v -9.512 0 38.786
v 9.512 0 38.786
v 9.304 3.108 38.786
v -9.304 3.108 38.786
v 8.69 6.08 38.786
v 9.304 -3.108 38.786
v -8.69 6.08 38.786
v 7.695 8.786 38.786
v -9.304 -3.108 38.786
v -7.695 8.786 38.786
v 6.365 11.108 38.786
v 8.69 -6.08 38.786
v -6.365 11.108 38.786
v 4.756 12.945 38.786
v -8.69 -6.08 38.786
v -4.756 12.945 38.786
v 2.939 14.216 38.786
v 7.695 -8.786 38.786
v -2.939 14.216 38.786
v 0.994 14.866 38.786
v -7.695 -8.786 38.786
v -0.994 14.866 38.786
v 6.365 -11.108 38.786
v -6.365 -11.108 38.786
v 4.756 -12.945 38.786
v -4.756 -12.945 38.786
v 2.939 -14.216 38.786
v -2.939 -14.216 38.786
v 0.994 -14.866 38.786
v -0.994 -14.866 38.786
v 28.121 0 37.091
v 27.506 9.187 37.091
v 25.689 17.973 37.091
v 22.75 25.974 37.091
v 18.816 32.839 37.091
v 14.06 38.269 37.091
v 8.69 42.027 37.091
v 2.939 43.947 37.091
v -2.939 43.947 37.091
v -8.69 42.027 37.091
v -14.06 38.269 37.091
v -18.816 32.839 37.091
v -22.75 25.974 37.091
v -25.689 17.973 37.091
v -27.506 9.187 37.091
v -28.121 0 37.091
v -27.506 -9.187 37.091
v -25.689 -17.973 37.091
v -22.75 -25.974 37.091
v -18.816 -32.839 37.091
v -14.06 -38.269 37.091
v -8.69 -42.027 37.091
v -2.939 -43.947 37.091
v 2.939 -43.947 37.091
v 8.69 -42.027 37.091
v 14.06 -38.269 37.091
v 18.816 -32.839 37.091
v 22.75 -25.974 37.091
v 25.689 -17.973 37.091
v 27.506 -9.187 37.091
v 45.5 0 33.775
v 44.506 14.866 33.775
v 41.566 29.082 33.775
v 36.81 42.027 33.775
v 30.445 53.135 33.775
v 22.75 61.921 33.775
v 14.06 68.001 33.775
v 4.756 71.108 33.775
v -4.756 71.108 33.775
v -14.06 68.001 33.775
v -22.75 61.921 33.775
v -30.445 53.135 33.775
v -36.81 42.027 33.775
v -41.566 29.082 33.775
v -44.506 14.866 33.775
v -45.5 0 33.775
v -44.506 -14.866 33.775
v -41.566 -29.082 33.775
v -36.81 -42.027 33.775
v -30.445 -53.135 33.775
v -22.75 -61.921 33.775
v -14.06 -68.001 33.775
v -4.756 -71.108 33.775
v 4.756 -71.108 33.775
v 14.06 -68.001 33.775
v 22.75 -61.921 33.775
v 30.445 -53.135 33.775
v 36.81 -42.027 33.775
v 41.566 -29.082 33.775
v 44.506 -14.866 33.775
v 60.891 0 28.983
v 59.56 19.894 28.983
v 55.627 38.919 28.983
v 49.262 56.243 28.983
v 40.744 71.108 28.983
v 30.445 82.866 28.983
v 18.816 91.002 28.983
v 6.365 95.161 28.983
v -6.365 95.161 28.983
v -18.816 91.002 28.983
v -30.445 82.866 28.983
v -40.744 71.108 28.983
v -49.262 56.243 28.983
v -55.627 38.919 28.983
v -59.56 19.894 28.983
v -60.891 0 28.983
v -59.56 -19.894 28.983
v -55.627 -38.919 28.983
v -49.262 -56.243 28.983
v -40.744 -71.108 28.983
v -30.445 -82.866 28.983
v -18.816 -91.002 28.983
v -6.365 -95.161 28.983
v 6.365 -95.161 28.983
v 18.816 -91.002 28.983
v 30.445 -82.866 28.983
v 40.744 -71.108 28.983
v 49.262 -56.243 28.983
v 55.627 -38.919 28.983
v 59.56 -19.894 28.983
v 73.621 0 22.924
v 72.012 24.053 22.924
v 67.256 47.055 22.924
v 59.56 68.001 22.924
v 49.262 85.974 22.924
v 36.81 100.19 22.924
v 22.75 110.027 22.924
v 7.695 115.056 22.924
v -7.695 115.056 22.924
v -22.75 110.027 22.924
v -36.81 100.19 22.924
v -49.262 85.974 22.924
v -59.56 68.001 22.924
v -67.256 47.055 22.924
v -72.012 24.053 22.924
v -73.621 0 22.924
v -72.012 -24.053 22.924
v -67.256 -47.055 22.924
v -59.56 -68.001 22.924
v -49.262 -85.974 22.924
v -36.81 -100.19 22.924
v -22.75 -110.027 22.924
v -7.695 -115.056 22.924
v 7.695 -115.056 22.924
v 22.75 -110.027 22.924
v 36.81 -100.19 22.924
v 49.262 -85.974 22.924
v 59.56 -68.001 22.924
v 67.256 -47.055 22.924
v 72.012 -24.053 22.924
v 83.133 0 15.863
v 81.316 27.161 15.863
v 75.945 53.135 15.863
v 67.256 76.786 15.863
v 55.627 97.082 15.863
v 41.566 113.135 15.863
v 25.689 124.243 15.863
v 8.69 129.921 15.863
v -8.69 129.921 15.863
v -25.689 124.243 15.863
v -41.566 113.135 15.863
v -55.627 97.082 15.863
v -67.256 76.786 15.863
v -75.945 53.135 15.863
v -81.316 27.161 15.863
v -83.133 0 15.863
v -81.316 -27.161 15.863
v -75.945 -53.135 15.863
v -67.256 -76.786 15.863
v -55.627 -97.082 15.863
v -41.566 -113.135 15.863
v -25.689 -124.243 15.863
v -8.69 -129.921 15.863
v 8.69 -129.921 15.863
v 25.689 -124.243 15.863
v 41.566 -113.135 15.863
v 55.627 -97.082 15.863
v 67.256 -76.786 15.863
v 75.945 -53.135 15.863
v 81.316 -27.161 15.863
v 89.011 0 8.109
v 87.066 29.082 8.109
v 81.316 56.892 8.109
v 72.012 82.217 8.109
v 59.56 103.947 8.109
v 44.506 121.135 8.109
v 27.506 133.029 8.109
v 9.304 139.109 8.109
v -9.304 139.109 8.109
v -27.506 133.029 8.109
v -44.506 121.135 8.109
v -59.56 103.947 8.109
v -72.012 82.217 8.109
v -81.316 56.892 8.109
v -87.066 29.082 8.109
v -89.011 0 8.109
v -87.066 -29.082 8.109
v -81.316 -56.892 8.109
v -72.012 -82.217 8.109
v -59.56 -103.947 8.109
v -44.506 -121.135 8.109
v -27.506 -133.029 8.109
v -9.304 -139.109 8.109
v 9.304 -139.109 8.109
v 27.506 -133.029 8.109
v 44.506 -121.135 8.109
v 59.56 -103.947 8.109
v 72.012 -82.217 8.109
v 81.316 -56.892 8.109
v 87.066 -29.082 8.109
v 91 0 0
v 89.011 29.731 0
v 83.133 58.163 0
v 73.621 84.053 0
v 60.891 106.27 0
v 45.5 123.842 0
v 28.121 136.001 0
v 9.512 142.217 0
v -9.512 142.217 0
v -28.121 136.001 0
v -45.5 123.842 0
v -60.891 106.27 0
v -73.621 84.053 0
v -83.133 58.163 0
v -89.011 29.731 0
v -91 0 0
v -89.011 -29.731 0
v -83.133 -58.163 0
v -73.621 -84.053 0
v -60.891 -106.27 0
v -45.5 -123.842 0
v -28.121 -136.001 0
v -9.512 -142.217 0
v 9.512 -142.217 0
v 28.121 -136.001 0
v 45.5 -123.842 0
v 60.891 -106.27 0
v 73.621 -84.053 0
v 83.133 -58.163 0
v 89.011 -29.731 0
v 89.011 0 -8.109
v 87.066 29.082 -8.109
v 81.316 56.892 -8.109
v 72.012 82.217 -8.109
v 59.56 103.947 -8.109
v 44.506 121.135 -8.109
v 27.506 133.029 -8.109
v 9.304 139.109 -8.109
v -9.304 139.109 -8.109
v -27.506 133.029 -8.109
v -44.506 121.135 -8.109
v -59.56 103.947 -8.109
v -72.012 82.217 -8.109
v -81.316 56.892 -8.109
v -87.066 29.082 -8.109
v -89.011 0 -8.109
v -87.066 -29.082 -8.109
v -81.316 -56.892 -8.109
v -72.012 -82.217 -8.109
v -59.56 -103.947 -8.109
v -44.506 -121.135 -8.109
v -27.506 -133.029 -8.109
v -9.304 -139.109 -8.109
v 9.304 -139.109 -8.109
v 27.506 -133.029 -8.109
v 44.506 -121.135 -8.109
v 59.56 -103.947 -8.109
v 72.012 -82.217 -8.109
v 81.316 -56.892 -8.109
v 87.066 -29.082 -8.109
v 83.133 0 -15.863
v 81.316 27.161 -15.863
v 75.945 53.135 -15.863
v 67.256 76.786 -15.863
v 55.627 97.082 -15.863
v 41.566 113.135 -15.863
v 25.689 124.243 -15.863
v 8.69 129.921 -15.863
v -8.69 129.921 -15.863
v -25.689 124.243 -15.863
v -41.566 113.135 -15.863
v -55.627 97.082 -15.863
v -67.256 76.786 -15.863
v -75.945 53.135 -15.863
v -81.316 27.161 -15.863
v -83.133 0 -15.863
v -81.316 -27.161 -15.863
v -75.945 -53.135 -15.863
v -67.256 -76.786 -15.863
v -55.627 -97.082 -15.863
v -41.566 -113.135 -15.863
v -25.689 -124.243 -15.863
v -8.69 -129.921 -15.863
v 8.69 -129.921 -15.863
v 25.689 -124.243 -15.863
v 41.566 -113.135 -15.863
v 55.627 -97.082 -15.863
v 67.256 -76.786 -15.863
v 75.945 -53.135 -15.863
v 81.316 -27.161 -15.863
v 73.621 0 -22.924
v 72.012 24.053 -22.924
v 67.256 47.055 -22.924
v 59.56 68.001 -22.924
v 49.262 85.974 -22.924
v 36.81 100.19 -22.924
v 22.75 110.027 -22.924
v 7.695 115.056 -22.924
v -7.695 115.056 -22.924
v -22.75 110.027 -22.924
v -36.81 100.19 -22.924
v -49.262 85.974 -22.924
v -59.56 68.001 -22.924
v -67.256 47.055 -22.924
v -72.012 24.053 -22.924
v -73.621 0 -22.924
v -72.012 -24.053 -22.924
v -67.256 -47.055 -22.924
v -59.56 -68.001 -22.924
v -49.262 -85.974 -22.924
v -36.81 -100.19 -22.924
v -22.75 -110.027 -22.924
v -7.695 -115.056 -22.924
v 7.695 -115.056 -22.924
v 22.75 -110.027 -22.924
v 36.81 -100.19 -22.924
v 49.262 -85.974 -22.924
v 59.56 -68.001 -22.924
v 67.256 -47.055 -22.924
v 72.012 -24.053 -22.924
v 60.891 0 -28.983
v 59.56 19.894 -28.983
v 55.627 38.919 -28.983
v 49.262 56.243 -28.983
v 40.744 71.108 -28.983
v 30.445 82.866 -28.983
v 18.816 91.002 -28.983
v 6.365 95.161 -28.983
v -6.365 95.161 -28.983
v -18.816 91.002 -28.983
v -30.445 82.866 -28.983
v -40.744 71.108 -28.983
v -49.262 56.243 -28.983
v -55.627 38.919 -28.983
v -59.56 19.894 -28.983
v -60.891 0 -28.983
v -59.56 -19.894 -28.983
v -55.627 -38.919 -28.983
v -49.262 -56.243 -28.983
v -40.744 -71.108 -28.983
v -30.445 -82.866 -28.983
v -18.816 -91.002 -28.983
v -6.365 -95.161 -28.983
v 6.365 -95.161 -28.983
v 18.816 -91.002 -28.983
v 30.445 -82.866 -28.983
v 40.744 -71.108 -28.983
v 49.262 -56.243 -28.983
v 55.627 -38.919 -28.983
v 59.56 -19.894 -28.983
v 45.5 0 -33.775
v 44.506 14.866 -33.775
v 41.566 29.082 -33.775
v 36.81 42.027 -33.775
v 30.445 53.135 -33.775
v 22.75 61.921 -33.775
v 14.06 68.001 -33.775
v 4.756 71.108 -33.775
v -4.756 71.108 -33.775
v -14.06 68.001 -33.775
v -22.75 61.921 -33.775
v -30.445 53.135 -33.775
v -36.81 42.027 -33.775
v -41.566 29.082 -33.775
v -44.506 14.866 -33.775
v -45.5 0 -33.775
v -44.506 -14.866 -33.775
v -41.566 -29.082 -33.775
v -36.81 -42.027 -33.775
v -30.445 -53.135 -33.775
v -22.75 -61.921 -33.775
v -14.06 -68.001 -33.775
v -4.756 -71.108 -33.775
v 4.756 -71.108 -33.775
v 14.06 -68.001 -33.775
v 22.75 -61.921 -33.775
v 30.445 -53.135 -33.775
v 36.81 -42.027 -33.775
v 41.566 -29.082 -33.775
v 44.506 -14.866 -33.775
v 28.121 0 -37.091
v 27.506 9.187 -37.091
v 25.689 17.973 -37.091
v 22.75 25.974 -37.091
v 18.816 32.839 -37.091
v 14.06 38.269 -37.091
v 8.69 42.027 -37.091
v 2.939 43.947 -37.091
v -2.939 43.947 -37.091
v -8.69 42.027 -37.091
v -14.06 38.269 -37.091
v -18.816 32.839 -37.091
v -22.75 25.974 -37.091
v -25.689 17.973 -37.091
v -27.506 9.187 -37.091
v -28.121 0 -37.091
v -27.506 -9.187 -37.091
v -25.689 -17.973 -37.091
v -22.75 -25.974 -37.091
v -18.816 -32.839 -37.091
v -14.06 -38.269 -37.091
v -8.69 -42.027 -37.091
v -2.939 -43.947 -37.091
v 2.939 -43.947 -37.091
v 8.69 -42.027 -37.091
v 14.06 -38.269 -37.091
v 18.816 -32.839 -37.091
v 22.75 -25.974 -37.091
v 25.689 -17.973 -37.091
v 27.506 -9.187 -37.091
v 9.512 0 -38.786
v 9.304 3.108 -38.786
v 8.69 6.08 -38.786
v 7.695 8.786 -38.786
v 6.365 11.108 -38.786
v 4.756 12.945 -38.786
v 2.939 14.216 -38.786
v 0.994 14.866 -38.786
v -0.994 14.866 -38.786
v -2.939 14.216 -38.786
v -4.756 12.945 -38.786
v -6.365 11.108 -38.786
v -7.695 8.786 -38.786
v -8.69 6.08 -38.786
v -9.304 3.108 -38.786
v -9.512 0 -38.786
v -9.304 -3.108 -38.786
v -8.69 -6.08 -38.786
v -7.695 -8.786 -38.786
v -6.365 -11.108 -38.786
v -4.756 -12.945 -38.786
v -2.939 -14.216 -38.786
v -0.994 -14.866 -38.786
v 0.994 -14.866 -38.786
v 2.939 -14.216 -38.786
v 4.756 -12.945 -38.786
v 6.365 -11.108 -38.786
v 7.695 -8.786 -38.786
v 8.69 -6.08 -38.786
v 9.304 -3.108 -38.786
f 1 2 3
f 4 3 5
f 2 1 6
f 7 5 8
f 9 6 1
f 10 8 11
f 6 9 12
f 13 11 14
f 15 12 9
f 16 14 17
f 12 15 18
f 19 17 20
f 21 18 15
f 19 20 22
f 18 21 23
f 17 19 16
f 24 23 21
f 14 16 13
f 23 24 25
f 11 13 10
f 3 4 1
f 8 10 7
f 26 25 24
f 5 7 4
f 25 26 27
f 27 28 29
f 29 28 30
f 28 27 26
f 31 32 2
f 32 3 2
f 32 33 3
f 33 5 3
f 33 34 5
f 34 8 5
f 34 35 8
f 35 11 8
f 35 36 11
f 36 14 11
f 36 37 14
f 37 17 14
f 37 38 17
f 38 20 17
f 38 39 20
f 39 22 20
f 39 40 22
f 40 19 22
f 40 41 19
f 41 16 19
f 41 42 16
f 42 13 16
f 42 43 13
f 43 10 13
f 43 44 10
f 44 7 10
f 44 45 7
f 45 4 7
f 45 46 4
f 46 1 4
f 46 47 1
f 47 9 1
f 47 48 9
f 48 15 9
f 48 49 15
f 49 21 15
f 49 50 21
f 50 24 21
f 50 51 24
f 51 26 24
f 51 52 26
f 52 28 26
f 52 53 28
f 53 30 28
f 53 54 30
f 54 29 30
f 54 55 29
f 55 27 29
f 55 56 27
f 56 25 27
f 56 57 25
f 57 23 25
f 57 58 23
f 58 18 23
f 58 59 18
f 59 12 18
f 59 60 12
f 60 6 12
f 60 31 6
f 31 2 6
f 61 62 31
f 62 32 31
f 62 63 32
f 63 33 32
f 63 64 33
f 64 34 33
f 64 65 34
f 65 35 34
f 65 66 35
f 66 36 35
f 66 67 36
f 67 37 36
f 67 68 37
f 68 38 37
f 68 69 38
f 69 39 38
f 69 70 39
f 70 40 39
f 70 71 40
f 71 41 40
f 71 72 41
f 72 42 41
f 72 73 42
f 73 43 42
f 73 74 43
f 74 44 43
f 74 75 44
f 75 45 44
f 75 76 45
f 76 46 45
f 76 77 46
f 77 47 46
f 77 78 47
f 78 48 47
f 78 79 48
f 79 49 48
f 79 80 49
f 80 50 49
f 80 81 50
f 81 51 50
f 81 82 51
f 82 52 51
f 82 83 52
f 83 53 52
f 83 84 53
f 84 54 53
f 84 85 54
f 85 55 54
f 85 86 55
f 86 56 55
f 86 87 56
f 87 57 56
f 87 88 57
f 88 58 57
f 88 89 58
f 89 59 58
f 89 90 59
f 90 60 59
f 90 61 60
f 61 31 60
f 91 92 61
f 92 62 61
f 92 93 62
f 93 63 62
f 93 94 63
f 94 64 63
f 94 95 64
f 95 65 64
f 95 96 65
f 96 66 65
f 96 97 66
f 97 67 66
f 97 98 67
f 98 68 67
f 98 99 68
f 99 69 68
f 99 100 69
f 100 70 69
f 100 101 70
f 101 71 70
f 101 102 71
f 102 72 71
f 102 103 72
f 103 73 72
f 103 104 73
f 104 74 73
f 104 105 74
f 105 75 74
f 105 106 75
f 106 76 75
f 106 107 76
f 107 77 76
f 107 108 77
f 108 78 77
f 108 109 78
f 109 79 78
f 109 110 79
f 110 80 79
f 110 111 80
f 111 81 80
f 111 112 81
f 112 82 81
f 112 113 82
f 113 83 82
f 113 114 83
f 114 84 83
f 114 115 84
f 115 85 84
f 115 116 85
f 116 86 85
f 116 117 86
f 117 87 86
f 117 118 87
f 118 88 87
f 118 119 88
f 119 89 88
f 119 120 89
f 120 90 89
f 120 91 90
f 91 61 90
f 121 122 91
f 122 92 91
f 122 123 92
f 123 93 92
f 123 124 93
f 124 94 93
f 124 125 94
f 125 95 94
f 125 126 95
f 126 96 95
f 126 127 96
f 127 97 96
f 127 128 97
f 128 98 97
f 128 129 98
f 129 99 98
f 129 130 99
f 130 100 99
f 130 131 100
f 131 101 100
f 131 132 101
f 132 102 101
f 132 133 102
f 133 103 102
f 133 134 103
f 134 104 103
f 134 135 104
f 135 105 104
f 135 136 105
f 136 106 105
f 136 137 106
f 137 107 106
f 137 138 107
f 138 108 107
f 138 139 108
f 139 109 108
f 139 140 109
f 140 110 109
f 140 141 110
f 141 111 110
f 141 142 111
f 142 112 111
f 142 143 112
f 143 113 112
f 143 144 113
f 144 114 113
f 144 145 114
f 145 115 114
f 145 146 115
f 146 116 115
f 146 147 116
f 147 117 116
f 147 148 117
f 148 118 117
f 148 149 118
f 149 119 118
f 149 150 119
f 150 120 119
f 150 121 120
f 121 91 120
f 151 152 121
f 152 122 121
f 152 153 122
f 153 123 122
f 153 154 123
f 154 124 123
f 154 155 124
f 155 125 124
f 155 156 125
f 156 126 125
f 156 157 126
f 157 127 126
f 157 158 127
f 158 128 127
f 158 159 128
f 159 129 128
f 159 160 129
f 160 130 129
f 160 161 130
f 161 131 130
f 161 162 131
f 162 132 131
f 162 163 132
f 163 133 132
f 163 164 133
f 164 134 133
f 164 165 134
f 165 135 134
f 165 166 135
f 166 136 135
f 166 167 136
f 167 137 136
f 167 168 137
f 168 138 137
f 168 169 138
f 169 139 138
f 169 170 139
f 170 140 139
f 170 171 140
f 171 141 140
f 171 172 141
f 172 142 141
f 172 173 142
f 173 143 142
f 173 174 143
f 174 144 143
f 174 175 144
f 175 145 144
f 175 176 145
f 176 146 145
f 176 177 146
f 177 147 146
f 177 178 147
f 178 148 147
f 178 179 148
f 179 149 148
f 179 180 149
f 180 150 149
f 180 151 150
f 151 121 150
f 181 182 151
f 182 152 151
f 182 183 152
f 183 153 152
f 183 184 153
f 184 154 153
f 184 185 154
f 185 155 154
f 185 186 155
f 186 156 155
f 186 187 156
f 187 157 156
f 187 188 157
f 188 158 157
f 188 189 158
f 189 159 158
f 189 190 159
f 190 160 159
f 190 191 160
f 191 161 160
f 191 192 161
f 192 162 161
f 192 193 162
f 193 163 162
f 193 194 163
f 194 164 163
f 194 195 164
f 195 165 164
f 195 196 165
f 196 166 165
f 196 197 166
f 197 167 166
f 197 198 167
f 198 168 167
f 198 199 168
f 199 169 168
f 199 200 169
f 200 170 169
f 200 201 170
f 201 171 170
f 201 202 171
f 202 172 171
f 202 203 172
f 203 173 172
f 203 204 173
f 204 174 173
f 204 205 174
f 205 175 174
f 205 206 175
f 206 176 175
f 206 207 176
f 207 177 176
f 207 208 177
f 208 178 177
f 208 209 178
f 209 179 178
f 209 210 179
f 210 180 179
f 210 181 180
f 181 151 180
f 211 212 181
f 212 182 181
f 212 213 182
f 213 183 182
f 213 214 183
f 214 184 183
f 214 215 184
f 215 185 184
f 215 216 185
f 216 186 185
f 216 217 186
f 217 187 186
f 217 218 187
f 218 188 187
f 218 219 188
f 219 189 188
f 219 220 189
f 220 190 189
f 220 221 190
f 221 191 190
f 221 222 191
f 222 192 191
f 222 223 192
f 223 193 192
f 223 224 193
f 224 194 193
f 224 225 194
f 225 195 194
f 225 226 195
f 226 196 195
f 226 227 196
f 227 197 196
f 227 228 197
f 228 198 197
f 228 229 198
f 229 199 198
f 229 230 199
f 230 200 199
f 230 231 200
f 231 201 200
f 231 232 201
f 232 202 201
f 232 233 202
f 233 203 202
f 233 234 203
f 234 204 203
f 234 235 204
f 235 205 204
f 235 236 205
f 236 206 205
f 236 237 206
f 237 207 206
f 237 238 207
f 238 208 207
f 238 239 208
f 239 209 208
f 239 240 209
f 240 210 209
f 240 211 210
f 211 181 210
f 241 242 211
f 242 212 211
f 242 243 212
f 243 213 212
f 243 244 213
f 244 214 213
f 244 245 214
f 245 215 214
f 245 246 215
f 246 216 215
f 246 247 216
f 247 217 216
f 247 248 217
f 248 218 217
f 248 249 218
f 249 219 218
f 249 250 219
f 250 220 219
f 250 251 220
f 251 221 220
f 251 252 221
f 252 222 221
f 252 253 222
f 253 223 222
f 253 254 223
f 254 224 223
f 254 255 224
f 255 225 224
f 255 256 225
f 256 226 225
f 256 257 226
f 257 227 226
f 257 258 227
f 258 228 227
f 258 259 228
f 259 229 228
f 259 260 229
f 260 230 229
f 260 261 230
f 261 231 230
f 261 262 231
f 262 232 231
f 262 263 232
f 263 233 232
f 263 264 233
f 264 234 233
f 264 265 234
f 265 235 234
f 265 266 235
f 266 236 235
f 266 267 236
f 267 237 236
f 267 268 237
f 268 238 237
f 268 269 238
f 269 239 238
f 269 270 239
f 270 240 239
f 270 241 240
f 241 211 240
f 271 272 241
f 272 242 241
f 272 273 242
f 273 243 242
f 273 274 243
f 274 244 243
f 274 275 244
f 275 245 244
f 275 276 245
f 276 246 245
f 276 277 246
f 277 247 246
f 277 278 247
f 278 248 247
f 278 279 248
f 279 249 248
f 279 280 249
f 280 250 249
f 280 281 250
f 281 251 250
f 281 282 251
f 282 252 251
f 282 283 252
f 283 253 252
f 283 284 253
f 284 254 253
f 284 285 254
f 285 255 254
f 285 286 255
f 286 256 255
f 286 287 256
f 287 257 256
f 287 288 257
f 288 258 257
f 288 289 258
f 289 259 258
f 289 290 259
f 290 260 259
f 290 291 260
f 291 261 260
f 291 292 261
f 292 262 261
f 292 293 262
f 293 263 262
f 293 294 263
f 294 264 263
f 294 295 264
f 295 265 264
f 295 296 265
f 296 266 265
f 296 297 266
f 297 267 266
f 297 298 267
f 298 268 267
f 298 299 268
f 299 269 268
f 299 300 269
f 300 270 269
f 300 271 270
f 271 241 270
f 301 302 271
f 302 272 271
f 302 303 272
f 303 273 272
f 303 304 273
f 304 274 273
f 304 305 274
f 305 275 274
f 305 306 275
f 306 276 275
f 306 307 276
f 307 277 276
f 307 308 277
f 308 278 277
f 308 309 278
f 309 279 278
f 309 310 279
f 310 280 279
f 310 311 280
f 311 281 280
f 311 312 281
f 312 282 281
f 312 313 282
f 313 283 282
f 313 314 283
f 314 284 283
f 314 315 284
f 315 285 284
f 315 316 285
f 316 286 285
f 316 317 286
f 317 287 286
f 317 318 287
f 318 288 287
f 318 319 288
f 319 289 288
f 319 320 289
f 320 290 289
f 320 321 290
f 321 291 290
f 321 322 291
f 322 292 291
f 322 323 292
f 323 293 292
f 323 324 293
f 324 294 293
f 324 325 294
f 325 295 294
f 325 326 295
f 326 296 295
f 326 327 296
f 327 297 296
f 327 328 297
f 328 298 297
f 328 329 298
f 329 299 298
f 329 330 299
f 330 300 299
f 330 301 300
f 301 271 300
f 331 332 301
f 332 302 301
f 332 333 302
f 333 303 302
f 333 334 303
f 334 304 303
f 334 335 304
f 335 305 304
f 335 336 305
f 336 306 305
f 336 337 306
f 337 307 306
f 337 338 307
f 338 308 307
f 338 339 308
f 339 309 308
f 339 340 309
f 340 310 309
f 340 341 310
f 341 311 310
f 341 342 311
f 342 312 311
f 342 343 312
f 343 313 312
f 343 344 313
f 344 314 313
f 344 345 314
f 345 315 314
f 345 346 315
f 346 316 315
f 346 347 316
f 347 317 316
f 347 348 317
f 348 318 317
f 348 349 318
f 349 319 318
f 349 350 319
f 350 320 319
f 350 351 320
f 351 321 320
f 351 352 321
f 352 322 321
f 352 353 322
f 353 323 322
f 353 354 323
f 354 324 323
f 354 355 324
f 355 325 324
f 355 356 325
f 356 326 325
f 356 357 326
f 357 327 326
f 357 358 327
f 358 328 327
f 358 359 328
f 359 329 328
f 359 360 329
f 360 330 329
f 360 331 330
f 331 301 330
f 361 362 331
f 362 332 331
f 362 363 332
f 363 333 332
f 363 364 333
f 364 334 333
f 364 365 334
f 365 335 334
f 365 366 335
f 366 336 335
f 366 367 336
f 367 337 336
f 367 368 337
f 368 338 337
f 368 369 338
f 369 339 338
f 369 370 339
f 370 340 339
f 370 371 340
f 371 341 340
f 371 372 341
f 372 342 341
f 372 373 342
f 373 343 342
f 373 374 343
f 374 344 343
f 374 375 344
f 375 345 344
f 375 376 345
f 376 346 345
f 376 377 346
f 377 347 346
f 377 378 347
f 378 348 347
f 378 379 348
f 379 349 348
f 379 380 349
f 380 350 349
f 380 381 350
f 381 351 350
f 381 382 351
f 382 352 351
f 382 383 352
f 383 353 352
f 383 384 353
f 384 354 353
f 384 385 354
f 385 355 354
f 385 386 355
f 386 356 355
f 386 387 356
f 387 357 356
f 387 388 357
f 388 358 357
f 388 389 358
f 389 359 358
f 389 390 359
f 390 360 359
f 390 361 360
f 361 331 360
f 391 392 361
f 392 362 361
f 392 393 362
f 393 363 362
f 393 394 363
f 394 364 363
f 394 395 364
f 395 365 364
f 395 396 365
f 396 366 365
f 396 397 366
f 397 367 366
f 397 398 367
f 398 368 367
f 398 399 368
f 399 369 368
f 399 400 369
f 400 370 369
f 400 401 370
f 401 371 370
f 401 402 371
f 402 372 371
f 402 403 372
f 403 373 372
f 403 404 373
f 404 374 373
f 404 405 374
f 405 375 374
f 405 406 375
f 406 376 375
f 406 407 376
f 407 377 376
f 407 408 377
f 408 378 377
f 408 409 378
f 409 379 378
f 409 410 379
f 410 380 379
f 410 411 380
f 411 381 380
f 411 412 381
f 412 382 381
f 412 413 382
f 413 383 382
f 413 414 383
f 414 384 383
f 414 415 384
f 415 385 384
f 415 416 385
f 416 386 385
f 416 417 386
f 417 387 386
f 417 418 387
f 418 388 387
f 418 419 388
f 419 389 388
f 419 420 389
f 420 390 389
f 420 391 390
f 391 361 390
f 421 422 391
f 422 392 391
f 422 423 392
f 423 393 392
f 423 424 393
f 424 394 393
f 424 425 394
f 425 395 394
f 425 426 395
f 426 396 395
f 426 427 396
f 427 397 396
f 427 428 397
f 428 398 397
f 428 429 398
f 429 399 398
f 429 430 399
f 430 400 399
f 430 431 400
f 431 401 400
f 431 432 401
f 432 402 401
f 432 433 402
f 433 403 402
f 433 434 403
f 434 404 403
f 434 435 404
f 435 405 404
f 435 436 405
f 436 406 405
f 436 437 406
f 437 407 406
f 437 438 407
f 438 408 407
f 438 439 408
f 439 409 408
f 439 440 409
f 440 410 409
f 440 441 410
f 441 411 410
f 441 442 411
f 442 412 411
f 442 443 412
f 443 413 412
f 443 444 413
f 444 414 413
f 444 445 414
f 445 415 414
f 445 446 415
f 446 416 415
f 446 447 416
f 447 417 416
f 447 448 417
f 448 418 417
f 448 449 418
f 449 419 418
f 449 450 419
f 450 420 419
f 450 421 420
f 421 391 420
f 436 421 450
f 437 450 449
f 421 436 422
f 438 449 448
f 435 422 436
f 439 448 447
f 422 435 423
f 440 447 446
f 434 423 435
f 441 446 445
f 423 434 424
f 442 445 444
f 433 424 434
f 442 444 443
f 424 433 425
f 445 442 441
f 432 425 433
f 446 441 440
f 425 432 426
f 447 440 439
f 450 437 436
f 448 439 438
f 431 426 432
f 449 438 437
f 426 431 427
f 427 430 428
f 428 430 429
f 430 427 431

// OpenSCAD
// Generated by SolidPython 1.0.1 on 2020-07-29 00:46:47


scale(v = [7, 11, 3]) {
	sphere(r = 13);
}
/***********************************************
*********      SolidPython code:      **********
************************************************
 
# import packages: SolidPython
from solid import *
from solid.utils import *
from itertools import chain, combinations, permutations


class Resize:

    def __init__(self, scad_file):
        self.scad_file = scad_file
        #self.scad_file = import_scad(scad_file)
        # cone/cylinder param:
        self.r1 = 0
        self.r2 = 0
        self.h = 0
        # rectangular prism param:
        self.w = 0
        self.l = 0
        # ellipse param:
        self.r = 0

    # import OpenScad code (file name corresponds to shape)


    # classify shape + parameters
    def assign(self, param1, param2, param3):
        if self.scad_file == 'cone.scad':
            self.r1 = param1
            self.r2 = param2
            self.h = param3
        elif self.scad_file == 'cylinder.scad':
            self.r1 = param1
            self.r2 = param2
            self.h = param3
        elif self.scad_file == 'rectangularPrism.scad':
            self.h = param1
            self.l = param2
            self.w = param3
        else:
            self.r = param1
            self.h = param2

    # resize parameters
    def iterate(self):
        x = range(3, 20, 2)
        i = 1
        if self.scad_file == 'cone.scad':
            tempList = list(permutations(x, 2))
            for temp in tempList:
                param1 = temp[0]
                param2 = temp[1]
                filepath = 'produced_scad_files/' + 'cone' + str(param1) + '_' + str(param2) + '_' + '.scad'
                scad_render_to_file(cylinder(h=param1, r1=param2, r2=0), filepath)

        elif self.scad_file == 'cylinder.scad':
            tempList = list(permutations(x, 3))
            for temp in tempList:
                param1 = temp[0]
                param2 = temp[1]
                filepath = 'produced_scad_files/' + 'cylinder' + str(param1) + '_' + str(param2) + '_' + '.scad'
                scad_render_to_file(cylinder(h=param1, r1=param2, r2=param2), filepath)

        elif self.scad_file == 'rectangularPrism.scad':
            tempList = list(permutations(x, 3))
            for temp in tempList:
                param1 = temp[0]
                param2 = temp[1]
                param3 = temp[2]
                filepath = 'produced_scad_files/' + 'rectangularPrism' + str(param1) + '_' + str(param2) + '_' + str(
                    param3) + '.scad'
                scad_render_to_file(cube(size=(param1, param2, param3)), filepath)

        elif self.scad_file == 'ellipse.scad':
            tempList = list(permutations(x, 4))
            for temp in tempList:
                param1 = temp[0]
                param2 = temp[1]
                param3 = temp[2]
                param4 = temp[3]
                filepath = 'produced_scad_files/' + 'ellipse' + str(param1) + '_' + str(param2) + '_' + str(param3) + '_' + str(param4) + '.scad'
                scad_render_to_file(scale([param1, param2, param3])(sphere(r=param4)), filepath)

    def render_to_scadfile(self):
        scad_render_to_file(scad, 'example.scad') 
 
************************************************/
